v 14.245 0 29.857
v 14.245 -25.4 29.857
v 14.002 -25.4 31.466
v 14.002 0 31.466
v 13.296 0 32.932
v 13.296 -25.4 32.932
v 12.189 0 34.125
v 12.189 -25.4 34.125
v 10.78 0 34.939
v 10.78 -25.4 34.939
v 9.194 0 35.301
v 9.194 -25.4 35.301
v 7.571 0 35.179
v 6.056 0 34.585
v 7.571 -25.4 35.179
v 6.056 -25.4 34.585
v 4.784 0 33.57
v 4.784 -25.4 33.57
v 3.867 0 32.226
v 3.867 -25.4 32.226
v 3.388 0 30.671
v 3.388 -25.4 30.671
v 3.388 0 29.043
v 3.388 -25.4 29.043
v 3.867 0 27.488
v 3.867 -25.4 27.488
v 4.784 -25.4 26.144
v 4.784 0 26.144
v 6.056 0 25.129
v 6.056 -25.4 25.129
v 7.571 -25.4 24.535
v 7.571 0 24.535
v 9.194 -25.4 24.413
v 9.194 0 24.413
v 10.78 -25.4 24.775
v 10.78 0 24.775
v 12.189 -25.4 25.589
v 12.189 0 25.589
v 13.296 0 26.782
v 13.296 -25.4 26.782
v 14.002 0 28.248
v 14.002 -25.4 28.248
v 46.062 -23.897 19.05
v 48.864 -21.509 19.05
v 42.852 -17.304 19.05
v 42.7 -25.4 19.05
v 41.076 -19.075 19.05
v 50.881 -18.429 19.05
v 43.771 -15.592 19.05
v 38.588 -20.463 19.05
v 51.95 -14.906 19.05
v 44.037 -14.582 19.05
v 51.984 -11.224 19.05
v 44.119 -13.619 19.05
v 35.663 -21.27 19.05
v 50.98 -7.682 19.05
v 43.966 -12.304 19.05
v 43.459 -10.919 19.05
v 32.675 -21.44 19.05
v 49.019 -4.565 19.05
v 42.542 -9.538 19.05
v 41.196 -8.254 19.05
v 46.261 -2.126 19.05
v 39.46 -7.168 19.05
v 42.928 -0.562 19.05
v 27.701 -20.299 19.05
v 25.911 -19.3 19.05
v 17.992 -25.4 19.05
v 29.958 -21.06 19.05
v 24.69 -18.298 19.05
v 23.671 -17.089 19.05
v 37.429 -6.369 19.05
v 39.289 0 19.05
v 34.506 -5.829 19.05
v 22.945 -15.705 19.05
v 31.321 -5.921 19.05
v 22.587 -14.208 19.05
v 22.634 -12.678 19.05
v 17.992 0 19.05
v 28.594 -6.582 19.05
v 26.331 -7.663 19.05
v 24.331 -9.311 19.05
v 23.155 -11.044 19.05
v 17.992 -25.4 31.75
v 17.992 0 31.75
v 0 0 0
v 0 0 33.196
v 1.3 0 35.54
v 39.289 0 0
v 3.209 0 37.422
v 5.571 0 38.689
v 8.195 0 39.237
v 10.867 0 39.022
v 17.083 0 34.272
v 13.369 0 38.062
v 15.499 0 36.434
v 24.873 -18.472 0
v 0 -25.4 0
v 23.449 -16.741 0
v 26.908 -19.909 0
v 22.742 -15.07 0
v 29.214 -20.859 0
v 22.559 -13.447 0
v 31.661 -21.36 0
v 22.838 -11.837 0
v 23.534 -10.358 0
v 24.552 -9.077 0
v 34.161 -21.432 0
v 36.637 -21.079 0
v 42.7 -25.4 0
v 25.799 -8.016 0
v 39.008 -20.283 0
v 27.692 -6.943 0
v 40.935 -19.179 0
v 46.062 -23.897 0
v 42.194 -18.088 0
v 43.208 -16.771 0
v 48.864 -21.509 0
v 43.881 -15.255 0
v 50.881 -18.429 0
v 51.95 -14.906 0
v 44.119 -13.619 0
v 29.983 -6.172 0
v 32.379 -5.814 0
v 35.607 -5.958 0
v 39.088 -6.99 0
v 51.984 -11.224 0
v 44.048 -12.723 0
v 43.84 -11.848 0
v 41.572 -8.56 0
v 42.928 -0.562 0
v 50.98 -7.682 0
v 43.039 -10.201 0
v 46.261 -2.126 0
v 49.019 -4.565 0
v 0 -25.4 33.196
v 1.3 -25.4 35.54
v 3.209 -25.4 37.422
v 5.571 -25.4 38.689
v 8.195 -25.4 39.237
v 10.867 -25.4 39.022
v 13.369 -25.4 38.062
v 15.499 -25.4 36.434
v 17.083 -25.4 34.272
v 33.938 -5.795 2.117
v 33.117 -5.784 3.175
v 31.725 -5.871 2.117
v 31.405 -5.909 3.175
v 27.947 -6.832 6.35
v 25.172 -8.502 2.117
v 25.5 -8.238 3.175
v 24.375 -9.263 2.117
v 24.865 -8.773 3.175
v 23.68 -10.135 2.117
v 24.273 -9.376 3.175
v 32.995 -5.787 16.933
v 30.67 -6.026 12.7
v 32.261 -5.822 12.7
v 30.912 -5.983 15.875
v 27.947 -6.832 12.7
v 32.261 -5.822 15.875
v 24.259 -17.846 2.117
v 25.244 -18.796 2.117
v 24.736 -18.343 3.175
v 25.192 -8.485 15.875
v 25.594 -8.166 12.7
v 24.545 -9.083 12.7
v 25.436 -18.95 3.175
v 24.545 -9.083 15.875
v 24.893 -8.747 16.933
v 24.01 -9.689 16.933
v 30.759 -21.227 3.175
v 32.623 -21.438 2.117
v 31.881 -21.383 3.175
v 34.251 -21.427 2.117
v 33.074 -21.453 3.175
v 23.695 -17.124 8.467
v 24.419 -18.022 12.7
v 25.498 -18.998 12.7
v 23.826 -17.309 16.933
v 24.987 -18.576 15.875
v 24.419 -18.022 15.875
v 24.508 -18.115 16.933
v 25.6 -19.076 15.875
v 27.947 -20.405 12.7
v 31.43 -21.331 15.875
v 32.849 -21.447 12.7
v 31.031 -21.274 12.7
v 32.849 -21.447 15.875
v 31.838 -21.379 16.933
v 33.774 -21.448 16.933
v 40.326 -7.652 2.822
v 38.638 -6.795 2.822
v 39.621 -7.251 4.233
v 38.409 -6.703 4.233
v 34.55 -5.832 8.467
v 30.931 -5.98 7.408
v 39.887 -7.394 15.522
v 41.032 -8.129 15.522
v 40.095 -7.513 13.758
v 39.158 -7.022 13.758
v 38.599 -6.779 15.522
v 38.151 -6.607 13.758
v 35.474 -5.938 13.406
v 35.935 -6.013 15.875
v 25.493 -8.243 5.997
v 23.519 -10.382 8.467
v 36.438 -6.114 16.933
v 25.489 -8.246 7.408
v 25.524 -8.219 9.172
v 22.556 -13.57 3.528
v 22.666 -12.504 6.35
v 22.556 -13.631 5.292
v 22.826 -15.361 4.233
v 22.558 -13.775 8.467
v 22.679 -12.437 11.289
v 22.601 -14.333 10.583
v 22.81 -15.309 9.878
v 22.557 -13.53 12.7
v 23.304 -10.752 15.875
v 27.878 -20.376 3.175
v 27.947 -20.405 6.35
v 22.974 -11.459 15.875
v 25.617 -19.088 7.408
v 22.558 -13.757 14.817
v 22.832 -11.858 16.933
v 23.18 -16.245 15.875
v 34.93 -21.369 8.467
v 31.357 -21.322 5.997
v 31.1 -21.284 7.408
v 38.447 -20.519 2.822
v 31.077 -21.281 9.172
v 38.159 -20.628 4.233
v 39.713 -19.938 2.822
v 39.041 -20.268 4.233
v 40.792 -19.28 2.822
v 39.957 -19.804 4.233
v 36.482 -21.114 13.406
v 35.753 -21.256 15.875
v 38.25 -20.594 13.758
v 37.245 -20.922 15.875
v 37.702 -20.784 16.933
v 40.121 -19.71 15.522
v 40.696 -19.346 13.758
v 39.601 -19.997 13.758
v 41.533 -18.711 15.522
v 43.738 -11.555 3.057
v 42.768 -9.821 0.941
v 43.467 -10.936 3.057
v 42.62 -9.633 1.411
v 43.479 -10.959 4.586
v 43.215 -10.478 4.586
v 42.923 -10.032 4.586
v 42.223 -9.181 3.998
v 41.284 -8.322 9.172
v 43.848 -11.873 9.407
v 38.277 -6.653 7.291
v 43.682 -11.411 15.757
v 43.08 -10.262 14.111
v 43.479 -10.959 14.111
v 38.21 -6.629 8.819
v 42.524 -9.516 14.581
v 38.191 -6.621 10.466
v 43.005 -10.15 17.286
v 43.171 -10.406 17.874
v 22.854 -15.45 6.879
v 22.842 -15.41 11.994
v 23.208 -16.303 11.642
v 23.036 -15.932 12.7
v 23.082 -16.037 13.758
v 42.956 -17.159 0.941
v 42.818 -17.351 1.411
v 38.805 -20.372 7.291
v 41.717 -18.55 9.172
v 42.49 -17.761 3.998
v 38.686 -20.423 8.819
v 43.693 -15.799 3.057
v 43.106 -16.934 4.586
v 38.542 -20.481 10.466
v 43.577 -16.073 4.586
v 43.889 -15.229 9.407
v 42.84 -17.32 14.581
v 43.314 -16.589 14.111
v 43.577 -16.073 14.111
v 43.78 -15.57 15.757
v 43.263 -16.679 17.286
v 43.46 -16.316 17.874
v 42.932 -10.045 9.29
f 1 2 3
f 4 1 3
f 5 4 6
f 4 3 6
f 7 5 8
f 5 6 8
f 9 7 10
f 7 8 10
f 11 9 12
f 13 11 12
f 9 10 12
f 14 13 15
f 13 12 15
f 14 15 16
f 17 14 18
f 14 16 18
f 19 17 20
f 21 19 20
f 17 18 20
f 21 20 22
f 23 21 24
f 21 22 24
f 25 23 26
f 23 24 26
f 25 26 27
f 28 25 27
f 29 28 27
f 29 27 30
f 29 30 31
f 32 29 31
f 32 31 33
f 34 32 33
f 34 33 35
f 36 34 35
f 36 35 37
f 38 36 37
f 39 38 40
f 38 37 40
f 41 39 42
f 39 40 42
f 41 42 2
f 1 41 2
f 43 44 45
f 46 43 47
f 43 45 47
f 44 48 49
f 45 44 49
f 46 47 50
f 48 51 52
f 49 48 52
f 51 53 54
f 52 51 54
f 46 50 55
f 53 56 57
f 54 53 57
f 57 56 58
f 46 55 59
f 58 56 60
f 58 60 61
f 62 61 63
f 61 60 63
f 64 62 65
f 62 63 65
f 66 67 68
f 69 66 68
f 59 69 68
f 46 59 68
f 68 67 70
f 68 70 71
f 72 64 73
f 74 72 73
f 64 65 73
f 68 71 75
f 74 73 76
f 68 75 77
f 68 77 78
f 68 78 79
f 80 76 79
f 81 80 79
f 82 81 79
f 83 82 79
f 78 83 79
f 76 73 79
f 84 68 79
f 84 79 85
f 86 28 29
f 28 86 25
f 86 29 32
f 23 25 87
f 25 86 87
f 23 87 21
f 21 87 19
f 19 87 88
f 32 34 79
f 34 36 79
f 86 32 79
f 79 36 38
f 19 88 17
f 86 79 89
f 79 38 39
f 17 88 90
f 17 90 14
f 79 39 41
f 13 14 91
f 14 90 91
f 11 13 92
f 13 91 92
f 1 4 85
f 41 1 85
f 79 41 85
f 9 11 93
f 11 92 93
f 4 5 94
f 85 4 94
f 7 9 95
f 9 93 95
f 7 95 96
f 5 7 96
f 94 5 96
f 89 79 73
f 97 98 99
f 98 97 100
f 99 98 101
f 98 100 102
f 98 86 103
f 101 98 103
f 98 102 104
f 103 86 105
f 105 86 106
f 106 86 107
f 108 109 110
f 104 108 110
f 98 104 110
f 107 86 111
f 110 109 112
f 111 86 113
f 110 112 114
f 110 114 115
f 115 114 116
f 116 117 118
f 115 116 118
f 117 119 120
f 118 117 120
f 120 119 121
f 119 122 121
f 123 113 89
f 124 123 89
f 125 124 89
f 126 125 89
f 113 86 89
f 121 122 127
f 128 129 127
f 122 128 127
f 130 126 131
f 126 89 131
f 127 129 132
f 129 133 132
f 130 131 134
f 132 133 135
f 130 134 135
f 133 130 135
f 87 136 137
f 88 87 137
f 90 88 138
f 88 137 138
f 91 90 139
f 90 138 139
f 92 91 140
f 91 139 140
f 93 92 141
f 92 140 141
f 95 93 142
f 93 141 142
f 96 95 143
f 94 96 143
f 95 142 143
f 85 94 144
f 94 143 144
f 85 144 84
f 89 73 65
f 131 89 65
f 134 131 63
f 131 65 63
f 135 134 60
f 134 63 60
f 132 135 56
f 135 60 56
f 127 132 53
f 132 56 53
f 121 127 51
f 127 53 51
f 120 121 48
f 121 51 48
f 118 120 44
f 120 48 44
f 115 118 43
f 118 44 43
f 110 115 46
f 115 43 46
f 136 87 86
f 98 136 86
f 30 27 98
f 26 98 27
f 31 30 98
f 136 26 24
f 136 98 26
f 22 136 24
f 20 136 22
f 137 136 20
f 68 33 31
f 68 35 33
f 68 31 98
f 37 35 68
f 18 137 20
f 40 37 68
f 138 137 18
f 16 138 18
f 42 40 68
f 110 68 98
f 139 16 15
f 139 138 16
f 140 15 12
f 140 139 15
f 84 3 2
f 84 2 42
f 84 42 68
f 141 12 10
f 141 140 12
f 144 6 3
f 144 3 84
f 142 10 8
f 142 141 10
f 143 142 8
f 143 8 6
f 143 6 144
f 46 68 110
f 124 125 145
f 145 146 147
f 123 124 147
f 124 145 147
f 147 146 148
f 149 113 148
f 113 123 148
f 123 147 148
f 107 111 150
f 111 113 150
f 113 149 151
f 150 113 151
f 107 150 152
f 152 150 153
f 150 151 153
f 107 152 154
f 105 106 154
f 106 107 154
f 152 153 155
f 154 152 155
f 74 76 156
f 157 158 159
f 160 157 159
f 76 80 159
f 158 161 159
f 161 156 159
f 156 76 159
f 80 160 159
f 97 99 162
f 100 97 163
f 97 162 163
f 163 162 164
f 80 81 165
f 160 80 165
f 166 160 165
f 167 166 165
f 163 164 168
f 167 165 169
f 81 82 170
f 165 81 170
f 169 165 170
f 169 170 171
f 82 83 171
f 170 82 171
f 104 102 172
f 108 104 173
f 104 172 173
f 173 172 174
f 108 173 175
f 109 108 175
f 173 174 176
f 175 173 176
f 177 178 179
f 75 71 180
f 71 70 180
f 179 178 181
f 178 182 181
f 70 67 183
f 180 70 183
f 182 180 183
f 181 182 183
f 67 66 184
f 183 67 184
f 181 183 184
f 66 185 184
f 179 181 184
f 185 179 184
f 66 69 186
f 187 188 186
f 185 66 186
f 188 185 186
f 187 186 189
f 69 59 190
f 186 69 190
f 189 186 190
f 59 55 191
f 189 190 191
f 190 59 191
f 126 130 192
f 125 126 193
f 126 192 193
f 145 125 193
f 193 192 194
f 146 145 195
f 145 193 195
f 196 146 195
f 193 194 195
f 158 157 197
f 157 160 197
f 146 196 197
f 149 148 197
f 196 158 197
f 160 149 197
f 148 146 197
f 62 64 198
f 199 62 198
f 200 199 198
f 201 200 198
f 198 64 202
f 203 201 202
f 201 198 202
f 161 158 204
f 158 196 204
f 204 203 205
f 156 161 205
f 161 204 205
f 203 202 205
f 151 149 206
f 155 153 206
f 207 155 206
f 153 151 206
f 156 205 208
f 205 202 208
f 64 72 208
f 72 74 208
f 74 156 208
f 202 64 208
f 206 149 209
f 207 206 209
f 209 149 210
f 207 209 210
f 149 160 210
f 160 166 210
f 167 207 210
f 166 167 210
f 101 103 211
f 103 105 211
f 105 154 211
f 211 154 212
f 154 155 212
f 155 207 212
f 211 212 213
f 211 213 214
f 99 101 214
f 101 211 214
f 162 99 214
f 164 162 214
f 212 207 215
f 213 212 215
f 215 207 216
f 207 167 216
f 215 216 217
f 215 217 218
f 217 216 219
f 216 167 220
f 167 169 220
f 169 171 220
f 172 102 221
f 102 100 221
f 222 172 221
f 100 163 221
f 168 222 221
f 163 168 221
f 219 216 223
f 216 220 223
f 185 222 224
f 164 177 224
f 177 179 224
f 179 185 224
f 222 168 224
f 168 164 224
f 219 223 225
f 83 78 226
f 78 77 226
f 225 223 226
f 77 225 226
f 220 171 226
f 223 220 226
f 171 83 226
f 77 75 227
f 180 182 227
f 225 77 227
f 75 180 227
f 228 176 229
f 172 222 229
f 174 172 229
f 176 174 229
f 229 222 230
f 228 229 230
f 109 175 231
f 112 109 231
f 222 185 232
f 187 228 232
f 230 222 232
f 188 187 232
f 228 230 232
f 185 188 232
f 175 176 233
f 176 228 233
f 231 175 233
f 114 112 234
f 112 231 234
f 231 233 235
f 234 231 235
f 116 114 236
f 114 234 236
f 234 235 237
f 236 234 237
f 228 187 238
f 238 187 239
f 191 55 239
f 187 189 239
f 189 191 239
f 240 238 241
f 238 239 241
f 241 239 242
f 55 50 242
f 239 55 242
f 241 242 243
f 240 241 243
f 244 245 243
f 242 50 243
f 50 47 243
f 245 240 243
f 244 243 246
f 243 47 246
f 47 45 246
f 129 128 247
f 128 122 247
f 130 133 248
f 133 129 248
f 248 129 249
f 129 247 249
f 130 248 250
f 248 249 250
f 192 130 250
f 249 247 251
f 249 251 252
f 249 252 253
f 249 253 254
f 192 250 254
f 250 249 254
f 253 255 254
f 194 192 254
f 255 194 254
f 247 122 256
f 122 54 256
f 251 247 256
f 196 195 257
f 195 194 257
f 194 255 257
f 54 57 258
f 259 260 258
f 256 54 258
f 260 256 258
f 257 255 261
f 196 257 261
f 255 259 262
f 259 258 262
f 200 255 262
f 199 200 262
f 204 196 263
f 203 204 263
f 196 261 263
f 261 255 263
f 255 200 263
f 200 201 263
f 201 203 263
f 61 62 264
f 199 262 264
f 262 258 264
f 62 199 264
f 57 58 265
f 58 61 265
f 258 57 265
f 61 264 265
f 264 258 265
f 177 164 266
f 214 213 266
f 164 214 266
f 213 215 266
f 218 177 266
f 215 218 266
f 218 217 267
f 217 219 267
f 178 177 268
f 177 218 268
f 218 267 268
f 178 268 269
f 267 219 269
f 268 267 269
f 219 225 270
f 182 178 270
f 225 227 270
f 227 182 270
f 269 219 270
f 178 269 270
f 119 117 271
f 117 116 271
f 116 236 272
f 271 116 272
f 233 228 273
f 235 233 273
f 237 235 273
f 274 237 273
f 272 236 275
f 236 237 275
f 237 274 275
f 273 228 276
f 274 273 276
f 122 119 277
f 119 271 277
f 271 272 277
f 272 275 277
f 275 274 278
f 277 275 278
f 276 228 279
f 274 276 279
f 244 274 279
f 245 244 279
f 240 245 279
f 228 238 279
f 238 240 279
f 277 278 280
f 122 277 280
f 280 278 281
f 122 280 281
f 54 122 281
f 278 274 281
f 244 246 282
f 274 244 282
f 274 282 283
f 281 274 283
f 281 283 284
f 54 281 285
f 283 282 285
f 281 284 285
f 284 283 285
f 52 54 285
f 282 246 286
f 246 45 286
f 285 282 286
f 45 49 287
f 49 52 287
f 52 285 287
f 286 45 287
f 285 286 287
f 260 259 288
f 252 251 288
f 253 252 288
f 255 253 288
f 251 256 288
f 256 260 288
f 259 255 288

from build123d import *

# Parameters (mm, degrees)
F1_DEPTH = 25.4
F3_DEPTH = 25.4
F5_DEPTH = 25.4
F6_R     = 5.458925
F7_DEPTH = 25.4
F9_DEPTH = 25.4


with BuildPart() as f1:
    # F0 (on Front) → F1 (new body)
    with BuildSketch(Plane.XZ):
        Polygon((0, 44.45), (0, 0), (53.672622, 0), (53.672622, 19.05), (17.991669, 19.05), (17.991669, 44.45), align=None)
    extrude(amount=F1_DEPTH)

    # F2 (on face) → F3 (cut)
    with BuildSketch(Plane.XZ.offset(25.4)):
        with BuildLine():
            ThreePointArc((0, 33.195641), (9.538413, 39.225457), (17.991669, 31.75))
            Line((17.991669, 31.75), (17.991669, 44.45))
            Line((17.991669, 44.45), (0, 44.45))
            Line((0, 44.45), (0, 33.195641))
        make_face()
    extrude(amount=-F3_DEPTH, mode=Mode.SUBTRACT)

    # F4 (on face) → F5 (cut)
    with BuildSketch(Plane.XY.offset(19.05)):
        with BuildLine():
            ThreePointArc((39.288857, 0), (51.983616, -11.224049), (42.700373, -25.4))
            Line((42.700373, -25.4), (53.672622, -25.4))
            Line((53.672622, -25.4), (53.672622, 0))
            Line((53.672622, 0), (39.288857, 0))
        make_face()
    extrude(amount=-F5_DEPTH, mode=Mode.SUBTRACT)

    # F6 (on face) → F7 (cut)
    with BuildSketch(Plane.XZ.offset(25.4)):
        with Locations((8.785654, 29.857033)):
            Circle(F6_R)
    extrude(amount=-F7_DEPTH, mode=Mode.SUBTRACT)

    # F8 (on face) → F9 (cut)
    with BuildSketch(Plane.XY.offset(19.05)):
        with BuildLine():
            add(Edge.make_bspline(
                [(44.118993, -13.618723), (44.118993, -0.046107), (27.946753, -6.832415), (11.774514, -13.618723), (27.946753, -20.405032), (44.118993, -27.19134), (44.118993, -13.618723)],
                knots=[0, 0, 0, 2.094395, 2.094395, 4.18879, 4.18879, 6.283185, 6.283185, 6.283185], degree=2, weights=[1, 0.5, 1, 0.5, 1, 0.5, 1]))
        make_face()
    extrude(amount=-F9_DEPTH, mode=Mode.SUBTRACT)


solid = f1.part
